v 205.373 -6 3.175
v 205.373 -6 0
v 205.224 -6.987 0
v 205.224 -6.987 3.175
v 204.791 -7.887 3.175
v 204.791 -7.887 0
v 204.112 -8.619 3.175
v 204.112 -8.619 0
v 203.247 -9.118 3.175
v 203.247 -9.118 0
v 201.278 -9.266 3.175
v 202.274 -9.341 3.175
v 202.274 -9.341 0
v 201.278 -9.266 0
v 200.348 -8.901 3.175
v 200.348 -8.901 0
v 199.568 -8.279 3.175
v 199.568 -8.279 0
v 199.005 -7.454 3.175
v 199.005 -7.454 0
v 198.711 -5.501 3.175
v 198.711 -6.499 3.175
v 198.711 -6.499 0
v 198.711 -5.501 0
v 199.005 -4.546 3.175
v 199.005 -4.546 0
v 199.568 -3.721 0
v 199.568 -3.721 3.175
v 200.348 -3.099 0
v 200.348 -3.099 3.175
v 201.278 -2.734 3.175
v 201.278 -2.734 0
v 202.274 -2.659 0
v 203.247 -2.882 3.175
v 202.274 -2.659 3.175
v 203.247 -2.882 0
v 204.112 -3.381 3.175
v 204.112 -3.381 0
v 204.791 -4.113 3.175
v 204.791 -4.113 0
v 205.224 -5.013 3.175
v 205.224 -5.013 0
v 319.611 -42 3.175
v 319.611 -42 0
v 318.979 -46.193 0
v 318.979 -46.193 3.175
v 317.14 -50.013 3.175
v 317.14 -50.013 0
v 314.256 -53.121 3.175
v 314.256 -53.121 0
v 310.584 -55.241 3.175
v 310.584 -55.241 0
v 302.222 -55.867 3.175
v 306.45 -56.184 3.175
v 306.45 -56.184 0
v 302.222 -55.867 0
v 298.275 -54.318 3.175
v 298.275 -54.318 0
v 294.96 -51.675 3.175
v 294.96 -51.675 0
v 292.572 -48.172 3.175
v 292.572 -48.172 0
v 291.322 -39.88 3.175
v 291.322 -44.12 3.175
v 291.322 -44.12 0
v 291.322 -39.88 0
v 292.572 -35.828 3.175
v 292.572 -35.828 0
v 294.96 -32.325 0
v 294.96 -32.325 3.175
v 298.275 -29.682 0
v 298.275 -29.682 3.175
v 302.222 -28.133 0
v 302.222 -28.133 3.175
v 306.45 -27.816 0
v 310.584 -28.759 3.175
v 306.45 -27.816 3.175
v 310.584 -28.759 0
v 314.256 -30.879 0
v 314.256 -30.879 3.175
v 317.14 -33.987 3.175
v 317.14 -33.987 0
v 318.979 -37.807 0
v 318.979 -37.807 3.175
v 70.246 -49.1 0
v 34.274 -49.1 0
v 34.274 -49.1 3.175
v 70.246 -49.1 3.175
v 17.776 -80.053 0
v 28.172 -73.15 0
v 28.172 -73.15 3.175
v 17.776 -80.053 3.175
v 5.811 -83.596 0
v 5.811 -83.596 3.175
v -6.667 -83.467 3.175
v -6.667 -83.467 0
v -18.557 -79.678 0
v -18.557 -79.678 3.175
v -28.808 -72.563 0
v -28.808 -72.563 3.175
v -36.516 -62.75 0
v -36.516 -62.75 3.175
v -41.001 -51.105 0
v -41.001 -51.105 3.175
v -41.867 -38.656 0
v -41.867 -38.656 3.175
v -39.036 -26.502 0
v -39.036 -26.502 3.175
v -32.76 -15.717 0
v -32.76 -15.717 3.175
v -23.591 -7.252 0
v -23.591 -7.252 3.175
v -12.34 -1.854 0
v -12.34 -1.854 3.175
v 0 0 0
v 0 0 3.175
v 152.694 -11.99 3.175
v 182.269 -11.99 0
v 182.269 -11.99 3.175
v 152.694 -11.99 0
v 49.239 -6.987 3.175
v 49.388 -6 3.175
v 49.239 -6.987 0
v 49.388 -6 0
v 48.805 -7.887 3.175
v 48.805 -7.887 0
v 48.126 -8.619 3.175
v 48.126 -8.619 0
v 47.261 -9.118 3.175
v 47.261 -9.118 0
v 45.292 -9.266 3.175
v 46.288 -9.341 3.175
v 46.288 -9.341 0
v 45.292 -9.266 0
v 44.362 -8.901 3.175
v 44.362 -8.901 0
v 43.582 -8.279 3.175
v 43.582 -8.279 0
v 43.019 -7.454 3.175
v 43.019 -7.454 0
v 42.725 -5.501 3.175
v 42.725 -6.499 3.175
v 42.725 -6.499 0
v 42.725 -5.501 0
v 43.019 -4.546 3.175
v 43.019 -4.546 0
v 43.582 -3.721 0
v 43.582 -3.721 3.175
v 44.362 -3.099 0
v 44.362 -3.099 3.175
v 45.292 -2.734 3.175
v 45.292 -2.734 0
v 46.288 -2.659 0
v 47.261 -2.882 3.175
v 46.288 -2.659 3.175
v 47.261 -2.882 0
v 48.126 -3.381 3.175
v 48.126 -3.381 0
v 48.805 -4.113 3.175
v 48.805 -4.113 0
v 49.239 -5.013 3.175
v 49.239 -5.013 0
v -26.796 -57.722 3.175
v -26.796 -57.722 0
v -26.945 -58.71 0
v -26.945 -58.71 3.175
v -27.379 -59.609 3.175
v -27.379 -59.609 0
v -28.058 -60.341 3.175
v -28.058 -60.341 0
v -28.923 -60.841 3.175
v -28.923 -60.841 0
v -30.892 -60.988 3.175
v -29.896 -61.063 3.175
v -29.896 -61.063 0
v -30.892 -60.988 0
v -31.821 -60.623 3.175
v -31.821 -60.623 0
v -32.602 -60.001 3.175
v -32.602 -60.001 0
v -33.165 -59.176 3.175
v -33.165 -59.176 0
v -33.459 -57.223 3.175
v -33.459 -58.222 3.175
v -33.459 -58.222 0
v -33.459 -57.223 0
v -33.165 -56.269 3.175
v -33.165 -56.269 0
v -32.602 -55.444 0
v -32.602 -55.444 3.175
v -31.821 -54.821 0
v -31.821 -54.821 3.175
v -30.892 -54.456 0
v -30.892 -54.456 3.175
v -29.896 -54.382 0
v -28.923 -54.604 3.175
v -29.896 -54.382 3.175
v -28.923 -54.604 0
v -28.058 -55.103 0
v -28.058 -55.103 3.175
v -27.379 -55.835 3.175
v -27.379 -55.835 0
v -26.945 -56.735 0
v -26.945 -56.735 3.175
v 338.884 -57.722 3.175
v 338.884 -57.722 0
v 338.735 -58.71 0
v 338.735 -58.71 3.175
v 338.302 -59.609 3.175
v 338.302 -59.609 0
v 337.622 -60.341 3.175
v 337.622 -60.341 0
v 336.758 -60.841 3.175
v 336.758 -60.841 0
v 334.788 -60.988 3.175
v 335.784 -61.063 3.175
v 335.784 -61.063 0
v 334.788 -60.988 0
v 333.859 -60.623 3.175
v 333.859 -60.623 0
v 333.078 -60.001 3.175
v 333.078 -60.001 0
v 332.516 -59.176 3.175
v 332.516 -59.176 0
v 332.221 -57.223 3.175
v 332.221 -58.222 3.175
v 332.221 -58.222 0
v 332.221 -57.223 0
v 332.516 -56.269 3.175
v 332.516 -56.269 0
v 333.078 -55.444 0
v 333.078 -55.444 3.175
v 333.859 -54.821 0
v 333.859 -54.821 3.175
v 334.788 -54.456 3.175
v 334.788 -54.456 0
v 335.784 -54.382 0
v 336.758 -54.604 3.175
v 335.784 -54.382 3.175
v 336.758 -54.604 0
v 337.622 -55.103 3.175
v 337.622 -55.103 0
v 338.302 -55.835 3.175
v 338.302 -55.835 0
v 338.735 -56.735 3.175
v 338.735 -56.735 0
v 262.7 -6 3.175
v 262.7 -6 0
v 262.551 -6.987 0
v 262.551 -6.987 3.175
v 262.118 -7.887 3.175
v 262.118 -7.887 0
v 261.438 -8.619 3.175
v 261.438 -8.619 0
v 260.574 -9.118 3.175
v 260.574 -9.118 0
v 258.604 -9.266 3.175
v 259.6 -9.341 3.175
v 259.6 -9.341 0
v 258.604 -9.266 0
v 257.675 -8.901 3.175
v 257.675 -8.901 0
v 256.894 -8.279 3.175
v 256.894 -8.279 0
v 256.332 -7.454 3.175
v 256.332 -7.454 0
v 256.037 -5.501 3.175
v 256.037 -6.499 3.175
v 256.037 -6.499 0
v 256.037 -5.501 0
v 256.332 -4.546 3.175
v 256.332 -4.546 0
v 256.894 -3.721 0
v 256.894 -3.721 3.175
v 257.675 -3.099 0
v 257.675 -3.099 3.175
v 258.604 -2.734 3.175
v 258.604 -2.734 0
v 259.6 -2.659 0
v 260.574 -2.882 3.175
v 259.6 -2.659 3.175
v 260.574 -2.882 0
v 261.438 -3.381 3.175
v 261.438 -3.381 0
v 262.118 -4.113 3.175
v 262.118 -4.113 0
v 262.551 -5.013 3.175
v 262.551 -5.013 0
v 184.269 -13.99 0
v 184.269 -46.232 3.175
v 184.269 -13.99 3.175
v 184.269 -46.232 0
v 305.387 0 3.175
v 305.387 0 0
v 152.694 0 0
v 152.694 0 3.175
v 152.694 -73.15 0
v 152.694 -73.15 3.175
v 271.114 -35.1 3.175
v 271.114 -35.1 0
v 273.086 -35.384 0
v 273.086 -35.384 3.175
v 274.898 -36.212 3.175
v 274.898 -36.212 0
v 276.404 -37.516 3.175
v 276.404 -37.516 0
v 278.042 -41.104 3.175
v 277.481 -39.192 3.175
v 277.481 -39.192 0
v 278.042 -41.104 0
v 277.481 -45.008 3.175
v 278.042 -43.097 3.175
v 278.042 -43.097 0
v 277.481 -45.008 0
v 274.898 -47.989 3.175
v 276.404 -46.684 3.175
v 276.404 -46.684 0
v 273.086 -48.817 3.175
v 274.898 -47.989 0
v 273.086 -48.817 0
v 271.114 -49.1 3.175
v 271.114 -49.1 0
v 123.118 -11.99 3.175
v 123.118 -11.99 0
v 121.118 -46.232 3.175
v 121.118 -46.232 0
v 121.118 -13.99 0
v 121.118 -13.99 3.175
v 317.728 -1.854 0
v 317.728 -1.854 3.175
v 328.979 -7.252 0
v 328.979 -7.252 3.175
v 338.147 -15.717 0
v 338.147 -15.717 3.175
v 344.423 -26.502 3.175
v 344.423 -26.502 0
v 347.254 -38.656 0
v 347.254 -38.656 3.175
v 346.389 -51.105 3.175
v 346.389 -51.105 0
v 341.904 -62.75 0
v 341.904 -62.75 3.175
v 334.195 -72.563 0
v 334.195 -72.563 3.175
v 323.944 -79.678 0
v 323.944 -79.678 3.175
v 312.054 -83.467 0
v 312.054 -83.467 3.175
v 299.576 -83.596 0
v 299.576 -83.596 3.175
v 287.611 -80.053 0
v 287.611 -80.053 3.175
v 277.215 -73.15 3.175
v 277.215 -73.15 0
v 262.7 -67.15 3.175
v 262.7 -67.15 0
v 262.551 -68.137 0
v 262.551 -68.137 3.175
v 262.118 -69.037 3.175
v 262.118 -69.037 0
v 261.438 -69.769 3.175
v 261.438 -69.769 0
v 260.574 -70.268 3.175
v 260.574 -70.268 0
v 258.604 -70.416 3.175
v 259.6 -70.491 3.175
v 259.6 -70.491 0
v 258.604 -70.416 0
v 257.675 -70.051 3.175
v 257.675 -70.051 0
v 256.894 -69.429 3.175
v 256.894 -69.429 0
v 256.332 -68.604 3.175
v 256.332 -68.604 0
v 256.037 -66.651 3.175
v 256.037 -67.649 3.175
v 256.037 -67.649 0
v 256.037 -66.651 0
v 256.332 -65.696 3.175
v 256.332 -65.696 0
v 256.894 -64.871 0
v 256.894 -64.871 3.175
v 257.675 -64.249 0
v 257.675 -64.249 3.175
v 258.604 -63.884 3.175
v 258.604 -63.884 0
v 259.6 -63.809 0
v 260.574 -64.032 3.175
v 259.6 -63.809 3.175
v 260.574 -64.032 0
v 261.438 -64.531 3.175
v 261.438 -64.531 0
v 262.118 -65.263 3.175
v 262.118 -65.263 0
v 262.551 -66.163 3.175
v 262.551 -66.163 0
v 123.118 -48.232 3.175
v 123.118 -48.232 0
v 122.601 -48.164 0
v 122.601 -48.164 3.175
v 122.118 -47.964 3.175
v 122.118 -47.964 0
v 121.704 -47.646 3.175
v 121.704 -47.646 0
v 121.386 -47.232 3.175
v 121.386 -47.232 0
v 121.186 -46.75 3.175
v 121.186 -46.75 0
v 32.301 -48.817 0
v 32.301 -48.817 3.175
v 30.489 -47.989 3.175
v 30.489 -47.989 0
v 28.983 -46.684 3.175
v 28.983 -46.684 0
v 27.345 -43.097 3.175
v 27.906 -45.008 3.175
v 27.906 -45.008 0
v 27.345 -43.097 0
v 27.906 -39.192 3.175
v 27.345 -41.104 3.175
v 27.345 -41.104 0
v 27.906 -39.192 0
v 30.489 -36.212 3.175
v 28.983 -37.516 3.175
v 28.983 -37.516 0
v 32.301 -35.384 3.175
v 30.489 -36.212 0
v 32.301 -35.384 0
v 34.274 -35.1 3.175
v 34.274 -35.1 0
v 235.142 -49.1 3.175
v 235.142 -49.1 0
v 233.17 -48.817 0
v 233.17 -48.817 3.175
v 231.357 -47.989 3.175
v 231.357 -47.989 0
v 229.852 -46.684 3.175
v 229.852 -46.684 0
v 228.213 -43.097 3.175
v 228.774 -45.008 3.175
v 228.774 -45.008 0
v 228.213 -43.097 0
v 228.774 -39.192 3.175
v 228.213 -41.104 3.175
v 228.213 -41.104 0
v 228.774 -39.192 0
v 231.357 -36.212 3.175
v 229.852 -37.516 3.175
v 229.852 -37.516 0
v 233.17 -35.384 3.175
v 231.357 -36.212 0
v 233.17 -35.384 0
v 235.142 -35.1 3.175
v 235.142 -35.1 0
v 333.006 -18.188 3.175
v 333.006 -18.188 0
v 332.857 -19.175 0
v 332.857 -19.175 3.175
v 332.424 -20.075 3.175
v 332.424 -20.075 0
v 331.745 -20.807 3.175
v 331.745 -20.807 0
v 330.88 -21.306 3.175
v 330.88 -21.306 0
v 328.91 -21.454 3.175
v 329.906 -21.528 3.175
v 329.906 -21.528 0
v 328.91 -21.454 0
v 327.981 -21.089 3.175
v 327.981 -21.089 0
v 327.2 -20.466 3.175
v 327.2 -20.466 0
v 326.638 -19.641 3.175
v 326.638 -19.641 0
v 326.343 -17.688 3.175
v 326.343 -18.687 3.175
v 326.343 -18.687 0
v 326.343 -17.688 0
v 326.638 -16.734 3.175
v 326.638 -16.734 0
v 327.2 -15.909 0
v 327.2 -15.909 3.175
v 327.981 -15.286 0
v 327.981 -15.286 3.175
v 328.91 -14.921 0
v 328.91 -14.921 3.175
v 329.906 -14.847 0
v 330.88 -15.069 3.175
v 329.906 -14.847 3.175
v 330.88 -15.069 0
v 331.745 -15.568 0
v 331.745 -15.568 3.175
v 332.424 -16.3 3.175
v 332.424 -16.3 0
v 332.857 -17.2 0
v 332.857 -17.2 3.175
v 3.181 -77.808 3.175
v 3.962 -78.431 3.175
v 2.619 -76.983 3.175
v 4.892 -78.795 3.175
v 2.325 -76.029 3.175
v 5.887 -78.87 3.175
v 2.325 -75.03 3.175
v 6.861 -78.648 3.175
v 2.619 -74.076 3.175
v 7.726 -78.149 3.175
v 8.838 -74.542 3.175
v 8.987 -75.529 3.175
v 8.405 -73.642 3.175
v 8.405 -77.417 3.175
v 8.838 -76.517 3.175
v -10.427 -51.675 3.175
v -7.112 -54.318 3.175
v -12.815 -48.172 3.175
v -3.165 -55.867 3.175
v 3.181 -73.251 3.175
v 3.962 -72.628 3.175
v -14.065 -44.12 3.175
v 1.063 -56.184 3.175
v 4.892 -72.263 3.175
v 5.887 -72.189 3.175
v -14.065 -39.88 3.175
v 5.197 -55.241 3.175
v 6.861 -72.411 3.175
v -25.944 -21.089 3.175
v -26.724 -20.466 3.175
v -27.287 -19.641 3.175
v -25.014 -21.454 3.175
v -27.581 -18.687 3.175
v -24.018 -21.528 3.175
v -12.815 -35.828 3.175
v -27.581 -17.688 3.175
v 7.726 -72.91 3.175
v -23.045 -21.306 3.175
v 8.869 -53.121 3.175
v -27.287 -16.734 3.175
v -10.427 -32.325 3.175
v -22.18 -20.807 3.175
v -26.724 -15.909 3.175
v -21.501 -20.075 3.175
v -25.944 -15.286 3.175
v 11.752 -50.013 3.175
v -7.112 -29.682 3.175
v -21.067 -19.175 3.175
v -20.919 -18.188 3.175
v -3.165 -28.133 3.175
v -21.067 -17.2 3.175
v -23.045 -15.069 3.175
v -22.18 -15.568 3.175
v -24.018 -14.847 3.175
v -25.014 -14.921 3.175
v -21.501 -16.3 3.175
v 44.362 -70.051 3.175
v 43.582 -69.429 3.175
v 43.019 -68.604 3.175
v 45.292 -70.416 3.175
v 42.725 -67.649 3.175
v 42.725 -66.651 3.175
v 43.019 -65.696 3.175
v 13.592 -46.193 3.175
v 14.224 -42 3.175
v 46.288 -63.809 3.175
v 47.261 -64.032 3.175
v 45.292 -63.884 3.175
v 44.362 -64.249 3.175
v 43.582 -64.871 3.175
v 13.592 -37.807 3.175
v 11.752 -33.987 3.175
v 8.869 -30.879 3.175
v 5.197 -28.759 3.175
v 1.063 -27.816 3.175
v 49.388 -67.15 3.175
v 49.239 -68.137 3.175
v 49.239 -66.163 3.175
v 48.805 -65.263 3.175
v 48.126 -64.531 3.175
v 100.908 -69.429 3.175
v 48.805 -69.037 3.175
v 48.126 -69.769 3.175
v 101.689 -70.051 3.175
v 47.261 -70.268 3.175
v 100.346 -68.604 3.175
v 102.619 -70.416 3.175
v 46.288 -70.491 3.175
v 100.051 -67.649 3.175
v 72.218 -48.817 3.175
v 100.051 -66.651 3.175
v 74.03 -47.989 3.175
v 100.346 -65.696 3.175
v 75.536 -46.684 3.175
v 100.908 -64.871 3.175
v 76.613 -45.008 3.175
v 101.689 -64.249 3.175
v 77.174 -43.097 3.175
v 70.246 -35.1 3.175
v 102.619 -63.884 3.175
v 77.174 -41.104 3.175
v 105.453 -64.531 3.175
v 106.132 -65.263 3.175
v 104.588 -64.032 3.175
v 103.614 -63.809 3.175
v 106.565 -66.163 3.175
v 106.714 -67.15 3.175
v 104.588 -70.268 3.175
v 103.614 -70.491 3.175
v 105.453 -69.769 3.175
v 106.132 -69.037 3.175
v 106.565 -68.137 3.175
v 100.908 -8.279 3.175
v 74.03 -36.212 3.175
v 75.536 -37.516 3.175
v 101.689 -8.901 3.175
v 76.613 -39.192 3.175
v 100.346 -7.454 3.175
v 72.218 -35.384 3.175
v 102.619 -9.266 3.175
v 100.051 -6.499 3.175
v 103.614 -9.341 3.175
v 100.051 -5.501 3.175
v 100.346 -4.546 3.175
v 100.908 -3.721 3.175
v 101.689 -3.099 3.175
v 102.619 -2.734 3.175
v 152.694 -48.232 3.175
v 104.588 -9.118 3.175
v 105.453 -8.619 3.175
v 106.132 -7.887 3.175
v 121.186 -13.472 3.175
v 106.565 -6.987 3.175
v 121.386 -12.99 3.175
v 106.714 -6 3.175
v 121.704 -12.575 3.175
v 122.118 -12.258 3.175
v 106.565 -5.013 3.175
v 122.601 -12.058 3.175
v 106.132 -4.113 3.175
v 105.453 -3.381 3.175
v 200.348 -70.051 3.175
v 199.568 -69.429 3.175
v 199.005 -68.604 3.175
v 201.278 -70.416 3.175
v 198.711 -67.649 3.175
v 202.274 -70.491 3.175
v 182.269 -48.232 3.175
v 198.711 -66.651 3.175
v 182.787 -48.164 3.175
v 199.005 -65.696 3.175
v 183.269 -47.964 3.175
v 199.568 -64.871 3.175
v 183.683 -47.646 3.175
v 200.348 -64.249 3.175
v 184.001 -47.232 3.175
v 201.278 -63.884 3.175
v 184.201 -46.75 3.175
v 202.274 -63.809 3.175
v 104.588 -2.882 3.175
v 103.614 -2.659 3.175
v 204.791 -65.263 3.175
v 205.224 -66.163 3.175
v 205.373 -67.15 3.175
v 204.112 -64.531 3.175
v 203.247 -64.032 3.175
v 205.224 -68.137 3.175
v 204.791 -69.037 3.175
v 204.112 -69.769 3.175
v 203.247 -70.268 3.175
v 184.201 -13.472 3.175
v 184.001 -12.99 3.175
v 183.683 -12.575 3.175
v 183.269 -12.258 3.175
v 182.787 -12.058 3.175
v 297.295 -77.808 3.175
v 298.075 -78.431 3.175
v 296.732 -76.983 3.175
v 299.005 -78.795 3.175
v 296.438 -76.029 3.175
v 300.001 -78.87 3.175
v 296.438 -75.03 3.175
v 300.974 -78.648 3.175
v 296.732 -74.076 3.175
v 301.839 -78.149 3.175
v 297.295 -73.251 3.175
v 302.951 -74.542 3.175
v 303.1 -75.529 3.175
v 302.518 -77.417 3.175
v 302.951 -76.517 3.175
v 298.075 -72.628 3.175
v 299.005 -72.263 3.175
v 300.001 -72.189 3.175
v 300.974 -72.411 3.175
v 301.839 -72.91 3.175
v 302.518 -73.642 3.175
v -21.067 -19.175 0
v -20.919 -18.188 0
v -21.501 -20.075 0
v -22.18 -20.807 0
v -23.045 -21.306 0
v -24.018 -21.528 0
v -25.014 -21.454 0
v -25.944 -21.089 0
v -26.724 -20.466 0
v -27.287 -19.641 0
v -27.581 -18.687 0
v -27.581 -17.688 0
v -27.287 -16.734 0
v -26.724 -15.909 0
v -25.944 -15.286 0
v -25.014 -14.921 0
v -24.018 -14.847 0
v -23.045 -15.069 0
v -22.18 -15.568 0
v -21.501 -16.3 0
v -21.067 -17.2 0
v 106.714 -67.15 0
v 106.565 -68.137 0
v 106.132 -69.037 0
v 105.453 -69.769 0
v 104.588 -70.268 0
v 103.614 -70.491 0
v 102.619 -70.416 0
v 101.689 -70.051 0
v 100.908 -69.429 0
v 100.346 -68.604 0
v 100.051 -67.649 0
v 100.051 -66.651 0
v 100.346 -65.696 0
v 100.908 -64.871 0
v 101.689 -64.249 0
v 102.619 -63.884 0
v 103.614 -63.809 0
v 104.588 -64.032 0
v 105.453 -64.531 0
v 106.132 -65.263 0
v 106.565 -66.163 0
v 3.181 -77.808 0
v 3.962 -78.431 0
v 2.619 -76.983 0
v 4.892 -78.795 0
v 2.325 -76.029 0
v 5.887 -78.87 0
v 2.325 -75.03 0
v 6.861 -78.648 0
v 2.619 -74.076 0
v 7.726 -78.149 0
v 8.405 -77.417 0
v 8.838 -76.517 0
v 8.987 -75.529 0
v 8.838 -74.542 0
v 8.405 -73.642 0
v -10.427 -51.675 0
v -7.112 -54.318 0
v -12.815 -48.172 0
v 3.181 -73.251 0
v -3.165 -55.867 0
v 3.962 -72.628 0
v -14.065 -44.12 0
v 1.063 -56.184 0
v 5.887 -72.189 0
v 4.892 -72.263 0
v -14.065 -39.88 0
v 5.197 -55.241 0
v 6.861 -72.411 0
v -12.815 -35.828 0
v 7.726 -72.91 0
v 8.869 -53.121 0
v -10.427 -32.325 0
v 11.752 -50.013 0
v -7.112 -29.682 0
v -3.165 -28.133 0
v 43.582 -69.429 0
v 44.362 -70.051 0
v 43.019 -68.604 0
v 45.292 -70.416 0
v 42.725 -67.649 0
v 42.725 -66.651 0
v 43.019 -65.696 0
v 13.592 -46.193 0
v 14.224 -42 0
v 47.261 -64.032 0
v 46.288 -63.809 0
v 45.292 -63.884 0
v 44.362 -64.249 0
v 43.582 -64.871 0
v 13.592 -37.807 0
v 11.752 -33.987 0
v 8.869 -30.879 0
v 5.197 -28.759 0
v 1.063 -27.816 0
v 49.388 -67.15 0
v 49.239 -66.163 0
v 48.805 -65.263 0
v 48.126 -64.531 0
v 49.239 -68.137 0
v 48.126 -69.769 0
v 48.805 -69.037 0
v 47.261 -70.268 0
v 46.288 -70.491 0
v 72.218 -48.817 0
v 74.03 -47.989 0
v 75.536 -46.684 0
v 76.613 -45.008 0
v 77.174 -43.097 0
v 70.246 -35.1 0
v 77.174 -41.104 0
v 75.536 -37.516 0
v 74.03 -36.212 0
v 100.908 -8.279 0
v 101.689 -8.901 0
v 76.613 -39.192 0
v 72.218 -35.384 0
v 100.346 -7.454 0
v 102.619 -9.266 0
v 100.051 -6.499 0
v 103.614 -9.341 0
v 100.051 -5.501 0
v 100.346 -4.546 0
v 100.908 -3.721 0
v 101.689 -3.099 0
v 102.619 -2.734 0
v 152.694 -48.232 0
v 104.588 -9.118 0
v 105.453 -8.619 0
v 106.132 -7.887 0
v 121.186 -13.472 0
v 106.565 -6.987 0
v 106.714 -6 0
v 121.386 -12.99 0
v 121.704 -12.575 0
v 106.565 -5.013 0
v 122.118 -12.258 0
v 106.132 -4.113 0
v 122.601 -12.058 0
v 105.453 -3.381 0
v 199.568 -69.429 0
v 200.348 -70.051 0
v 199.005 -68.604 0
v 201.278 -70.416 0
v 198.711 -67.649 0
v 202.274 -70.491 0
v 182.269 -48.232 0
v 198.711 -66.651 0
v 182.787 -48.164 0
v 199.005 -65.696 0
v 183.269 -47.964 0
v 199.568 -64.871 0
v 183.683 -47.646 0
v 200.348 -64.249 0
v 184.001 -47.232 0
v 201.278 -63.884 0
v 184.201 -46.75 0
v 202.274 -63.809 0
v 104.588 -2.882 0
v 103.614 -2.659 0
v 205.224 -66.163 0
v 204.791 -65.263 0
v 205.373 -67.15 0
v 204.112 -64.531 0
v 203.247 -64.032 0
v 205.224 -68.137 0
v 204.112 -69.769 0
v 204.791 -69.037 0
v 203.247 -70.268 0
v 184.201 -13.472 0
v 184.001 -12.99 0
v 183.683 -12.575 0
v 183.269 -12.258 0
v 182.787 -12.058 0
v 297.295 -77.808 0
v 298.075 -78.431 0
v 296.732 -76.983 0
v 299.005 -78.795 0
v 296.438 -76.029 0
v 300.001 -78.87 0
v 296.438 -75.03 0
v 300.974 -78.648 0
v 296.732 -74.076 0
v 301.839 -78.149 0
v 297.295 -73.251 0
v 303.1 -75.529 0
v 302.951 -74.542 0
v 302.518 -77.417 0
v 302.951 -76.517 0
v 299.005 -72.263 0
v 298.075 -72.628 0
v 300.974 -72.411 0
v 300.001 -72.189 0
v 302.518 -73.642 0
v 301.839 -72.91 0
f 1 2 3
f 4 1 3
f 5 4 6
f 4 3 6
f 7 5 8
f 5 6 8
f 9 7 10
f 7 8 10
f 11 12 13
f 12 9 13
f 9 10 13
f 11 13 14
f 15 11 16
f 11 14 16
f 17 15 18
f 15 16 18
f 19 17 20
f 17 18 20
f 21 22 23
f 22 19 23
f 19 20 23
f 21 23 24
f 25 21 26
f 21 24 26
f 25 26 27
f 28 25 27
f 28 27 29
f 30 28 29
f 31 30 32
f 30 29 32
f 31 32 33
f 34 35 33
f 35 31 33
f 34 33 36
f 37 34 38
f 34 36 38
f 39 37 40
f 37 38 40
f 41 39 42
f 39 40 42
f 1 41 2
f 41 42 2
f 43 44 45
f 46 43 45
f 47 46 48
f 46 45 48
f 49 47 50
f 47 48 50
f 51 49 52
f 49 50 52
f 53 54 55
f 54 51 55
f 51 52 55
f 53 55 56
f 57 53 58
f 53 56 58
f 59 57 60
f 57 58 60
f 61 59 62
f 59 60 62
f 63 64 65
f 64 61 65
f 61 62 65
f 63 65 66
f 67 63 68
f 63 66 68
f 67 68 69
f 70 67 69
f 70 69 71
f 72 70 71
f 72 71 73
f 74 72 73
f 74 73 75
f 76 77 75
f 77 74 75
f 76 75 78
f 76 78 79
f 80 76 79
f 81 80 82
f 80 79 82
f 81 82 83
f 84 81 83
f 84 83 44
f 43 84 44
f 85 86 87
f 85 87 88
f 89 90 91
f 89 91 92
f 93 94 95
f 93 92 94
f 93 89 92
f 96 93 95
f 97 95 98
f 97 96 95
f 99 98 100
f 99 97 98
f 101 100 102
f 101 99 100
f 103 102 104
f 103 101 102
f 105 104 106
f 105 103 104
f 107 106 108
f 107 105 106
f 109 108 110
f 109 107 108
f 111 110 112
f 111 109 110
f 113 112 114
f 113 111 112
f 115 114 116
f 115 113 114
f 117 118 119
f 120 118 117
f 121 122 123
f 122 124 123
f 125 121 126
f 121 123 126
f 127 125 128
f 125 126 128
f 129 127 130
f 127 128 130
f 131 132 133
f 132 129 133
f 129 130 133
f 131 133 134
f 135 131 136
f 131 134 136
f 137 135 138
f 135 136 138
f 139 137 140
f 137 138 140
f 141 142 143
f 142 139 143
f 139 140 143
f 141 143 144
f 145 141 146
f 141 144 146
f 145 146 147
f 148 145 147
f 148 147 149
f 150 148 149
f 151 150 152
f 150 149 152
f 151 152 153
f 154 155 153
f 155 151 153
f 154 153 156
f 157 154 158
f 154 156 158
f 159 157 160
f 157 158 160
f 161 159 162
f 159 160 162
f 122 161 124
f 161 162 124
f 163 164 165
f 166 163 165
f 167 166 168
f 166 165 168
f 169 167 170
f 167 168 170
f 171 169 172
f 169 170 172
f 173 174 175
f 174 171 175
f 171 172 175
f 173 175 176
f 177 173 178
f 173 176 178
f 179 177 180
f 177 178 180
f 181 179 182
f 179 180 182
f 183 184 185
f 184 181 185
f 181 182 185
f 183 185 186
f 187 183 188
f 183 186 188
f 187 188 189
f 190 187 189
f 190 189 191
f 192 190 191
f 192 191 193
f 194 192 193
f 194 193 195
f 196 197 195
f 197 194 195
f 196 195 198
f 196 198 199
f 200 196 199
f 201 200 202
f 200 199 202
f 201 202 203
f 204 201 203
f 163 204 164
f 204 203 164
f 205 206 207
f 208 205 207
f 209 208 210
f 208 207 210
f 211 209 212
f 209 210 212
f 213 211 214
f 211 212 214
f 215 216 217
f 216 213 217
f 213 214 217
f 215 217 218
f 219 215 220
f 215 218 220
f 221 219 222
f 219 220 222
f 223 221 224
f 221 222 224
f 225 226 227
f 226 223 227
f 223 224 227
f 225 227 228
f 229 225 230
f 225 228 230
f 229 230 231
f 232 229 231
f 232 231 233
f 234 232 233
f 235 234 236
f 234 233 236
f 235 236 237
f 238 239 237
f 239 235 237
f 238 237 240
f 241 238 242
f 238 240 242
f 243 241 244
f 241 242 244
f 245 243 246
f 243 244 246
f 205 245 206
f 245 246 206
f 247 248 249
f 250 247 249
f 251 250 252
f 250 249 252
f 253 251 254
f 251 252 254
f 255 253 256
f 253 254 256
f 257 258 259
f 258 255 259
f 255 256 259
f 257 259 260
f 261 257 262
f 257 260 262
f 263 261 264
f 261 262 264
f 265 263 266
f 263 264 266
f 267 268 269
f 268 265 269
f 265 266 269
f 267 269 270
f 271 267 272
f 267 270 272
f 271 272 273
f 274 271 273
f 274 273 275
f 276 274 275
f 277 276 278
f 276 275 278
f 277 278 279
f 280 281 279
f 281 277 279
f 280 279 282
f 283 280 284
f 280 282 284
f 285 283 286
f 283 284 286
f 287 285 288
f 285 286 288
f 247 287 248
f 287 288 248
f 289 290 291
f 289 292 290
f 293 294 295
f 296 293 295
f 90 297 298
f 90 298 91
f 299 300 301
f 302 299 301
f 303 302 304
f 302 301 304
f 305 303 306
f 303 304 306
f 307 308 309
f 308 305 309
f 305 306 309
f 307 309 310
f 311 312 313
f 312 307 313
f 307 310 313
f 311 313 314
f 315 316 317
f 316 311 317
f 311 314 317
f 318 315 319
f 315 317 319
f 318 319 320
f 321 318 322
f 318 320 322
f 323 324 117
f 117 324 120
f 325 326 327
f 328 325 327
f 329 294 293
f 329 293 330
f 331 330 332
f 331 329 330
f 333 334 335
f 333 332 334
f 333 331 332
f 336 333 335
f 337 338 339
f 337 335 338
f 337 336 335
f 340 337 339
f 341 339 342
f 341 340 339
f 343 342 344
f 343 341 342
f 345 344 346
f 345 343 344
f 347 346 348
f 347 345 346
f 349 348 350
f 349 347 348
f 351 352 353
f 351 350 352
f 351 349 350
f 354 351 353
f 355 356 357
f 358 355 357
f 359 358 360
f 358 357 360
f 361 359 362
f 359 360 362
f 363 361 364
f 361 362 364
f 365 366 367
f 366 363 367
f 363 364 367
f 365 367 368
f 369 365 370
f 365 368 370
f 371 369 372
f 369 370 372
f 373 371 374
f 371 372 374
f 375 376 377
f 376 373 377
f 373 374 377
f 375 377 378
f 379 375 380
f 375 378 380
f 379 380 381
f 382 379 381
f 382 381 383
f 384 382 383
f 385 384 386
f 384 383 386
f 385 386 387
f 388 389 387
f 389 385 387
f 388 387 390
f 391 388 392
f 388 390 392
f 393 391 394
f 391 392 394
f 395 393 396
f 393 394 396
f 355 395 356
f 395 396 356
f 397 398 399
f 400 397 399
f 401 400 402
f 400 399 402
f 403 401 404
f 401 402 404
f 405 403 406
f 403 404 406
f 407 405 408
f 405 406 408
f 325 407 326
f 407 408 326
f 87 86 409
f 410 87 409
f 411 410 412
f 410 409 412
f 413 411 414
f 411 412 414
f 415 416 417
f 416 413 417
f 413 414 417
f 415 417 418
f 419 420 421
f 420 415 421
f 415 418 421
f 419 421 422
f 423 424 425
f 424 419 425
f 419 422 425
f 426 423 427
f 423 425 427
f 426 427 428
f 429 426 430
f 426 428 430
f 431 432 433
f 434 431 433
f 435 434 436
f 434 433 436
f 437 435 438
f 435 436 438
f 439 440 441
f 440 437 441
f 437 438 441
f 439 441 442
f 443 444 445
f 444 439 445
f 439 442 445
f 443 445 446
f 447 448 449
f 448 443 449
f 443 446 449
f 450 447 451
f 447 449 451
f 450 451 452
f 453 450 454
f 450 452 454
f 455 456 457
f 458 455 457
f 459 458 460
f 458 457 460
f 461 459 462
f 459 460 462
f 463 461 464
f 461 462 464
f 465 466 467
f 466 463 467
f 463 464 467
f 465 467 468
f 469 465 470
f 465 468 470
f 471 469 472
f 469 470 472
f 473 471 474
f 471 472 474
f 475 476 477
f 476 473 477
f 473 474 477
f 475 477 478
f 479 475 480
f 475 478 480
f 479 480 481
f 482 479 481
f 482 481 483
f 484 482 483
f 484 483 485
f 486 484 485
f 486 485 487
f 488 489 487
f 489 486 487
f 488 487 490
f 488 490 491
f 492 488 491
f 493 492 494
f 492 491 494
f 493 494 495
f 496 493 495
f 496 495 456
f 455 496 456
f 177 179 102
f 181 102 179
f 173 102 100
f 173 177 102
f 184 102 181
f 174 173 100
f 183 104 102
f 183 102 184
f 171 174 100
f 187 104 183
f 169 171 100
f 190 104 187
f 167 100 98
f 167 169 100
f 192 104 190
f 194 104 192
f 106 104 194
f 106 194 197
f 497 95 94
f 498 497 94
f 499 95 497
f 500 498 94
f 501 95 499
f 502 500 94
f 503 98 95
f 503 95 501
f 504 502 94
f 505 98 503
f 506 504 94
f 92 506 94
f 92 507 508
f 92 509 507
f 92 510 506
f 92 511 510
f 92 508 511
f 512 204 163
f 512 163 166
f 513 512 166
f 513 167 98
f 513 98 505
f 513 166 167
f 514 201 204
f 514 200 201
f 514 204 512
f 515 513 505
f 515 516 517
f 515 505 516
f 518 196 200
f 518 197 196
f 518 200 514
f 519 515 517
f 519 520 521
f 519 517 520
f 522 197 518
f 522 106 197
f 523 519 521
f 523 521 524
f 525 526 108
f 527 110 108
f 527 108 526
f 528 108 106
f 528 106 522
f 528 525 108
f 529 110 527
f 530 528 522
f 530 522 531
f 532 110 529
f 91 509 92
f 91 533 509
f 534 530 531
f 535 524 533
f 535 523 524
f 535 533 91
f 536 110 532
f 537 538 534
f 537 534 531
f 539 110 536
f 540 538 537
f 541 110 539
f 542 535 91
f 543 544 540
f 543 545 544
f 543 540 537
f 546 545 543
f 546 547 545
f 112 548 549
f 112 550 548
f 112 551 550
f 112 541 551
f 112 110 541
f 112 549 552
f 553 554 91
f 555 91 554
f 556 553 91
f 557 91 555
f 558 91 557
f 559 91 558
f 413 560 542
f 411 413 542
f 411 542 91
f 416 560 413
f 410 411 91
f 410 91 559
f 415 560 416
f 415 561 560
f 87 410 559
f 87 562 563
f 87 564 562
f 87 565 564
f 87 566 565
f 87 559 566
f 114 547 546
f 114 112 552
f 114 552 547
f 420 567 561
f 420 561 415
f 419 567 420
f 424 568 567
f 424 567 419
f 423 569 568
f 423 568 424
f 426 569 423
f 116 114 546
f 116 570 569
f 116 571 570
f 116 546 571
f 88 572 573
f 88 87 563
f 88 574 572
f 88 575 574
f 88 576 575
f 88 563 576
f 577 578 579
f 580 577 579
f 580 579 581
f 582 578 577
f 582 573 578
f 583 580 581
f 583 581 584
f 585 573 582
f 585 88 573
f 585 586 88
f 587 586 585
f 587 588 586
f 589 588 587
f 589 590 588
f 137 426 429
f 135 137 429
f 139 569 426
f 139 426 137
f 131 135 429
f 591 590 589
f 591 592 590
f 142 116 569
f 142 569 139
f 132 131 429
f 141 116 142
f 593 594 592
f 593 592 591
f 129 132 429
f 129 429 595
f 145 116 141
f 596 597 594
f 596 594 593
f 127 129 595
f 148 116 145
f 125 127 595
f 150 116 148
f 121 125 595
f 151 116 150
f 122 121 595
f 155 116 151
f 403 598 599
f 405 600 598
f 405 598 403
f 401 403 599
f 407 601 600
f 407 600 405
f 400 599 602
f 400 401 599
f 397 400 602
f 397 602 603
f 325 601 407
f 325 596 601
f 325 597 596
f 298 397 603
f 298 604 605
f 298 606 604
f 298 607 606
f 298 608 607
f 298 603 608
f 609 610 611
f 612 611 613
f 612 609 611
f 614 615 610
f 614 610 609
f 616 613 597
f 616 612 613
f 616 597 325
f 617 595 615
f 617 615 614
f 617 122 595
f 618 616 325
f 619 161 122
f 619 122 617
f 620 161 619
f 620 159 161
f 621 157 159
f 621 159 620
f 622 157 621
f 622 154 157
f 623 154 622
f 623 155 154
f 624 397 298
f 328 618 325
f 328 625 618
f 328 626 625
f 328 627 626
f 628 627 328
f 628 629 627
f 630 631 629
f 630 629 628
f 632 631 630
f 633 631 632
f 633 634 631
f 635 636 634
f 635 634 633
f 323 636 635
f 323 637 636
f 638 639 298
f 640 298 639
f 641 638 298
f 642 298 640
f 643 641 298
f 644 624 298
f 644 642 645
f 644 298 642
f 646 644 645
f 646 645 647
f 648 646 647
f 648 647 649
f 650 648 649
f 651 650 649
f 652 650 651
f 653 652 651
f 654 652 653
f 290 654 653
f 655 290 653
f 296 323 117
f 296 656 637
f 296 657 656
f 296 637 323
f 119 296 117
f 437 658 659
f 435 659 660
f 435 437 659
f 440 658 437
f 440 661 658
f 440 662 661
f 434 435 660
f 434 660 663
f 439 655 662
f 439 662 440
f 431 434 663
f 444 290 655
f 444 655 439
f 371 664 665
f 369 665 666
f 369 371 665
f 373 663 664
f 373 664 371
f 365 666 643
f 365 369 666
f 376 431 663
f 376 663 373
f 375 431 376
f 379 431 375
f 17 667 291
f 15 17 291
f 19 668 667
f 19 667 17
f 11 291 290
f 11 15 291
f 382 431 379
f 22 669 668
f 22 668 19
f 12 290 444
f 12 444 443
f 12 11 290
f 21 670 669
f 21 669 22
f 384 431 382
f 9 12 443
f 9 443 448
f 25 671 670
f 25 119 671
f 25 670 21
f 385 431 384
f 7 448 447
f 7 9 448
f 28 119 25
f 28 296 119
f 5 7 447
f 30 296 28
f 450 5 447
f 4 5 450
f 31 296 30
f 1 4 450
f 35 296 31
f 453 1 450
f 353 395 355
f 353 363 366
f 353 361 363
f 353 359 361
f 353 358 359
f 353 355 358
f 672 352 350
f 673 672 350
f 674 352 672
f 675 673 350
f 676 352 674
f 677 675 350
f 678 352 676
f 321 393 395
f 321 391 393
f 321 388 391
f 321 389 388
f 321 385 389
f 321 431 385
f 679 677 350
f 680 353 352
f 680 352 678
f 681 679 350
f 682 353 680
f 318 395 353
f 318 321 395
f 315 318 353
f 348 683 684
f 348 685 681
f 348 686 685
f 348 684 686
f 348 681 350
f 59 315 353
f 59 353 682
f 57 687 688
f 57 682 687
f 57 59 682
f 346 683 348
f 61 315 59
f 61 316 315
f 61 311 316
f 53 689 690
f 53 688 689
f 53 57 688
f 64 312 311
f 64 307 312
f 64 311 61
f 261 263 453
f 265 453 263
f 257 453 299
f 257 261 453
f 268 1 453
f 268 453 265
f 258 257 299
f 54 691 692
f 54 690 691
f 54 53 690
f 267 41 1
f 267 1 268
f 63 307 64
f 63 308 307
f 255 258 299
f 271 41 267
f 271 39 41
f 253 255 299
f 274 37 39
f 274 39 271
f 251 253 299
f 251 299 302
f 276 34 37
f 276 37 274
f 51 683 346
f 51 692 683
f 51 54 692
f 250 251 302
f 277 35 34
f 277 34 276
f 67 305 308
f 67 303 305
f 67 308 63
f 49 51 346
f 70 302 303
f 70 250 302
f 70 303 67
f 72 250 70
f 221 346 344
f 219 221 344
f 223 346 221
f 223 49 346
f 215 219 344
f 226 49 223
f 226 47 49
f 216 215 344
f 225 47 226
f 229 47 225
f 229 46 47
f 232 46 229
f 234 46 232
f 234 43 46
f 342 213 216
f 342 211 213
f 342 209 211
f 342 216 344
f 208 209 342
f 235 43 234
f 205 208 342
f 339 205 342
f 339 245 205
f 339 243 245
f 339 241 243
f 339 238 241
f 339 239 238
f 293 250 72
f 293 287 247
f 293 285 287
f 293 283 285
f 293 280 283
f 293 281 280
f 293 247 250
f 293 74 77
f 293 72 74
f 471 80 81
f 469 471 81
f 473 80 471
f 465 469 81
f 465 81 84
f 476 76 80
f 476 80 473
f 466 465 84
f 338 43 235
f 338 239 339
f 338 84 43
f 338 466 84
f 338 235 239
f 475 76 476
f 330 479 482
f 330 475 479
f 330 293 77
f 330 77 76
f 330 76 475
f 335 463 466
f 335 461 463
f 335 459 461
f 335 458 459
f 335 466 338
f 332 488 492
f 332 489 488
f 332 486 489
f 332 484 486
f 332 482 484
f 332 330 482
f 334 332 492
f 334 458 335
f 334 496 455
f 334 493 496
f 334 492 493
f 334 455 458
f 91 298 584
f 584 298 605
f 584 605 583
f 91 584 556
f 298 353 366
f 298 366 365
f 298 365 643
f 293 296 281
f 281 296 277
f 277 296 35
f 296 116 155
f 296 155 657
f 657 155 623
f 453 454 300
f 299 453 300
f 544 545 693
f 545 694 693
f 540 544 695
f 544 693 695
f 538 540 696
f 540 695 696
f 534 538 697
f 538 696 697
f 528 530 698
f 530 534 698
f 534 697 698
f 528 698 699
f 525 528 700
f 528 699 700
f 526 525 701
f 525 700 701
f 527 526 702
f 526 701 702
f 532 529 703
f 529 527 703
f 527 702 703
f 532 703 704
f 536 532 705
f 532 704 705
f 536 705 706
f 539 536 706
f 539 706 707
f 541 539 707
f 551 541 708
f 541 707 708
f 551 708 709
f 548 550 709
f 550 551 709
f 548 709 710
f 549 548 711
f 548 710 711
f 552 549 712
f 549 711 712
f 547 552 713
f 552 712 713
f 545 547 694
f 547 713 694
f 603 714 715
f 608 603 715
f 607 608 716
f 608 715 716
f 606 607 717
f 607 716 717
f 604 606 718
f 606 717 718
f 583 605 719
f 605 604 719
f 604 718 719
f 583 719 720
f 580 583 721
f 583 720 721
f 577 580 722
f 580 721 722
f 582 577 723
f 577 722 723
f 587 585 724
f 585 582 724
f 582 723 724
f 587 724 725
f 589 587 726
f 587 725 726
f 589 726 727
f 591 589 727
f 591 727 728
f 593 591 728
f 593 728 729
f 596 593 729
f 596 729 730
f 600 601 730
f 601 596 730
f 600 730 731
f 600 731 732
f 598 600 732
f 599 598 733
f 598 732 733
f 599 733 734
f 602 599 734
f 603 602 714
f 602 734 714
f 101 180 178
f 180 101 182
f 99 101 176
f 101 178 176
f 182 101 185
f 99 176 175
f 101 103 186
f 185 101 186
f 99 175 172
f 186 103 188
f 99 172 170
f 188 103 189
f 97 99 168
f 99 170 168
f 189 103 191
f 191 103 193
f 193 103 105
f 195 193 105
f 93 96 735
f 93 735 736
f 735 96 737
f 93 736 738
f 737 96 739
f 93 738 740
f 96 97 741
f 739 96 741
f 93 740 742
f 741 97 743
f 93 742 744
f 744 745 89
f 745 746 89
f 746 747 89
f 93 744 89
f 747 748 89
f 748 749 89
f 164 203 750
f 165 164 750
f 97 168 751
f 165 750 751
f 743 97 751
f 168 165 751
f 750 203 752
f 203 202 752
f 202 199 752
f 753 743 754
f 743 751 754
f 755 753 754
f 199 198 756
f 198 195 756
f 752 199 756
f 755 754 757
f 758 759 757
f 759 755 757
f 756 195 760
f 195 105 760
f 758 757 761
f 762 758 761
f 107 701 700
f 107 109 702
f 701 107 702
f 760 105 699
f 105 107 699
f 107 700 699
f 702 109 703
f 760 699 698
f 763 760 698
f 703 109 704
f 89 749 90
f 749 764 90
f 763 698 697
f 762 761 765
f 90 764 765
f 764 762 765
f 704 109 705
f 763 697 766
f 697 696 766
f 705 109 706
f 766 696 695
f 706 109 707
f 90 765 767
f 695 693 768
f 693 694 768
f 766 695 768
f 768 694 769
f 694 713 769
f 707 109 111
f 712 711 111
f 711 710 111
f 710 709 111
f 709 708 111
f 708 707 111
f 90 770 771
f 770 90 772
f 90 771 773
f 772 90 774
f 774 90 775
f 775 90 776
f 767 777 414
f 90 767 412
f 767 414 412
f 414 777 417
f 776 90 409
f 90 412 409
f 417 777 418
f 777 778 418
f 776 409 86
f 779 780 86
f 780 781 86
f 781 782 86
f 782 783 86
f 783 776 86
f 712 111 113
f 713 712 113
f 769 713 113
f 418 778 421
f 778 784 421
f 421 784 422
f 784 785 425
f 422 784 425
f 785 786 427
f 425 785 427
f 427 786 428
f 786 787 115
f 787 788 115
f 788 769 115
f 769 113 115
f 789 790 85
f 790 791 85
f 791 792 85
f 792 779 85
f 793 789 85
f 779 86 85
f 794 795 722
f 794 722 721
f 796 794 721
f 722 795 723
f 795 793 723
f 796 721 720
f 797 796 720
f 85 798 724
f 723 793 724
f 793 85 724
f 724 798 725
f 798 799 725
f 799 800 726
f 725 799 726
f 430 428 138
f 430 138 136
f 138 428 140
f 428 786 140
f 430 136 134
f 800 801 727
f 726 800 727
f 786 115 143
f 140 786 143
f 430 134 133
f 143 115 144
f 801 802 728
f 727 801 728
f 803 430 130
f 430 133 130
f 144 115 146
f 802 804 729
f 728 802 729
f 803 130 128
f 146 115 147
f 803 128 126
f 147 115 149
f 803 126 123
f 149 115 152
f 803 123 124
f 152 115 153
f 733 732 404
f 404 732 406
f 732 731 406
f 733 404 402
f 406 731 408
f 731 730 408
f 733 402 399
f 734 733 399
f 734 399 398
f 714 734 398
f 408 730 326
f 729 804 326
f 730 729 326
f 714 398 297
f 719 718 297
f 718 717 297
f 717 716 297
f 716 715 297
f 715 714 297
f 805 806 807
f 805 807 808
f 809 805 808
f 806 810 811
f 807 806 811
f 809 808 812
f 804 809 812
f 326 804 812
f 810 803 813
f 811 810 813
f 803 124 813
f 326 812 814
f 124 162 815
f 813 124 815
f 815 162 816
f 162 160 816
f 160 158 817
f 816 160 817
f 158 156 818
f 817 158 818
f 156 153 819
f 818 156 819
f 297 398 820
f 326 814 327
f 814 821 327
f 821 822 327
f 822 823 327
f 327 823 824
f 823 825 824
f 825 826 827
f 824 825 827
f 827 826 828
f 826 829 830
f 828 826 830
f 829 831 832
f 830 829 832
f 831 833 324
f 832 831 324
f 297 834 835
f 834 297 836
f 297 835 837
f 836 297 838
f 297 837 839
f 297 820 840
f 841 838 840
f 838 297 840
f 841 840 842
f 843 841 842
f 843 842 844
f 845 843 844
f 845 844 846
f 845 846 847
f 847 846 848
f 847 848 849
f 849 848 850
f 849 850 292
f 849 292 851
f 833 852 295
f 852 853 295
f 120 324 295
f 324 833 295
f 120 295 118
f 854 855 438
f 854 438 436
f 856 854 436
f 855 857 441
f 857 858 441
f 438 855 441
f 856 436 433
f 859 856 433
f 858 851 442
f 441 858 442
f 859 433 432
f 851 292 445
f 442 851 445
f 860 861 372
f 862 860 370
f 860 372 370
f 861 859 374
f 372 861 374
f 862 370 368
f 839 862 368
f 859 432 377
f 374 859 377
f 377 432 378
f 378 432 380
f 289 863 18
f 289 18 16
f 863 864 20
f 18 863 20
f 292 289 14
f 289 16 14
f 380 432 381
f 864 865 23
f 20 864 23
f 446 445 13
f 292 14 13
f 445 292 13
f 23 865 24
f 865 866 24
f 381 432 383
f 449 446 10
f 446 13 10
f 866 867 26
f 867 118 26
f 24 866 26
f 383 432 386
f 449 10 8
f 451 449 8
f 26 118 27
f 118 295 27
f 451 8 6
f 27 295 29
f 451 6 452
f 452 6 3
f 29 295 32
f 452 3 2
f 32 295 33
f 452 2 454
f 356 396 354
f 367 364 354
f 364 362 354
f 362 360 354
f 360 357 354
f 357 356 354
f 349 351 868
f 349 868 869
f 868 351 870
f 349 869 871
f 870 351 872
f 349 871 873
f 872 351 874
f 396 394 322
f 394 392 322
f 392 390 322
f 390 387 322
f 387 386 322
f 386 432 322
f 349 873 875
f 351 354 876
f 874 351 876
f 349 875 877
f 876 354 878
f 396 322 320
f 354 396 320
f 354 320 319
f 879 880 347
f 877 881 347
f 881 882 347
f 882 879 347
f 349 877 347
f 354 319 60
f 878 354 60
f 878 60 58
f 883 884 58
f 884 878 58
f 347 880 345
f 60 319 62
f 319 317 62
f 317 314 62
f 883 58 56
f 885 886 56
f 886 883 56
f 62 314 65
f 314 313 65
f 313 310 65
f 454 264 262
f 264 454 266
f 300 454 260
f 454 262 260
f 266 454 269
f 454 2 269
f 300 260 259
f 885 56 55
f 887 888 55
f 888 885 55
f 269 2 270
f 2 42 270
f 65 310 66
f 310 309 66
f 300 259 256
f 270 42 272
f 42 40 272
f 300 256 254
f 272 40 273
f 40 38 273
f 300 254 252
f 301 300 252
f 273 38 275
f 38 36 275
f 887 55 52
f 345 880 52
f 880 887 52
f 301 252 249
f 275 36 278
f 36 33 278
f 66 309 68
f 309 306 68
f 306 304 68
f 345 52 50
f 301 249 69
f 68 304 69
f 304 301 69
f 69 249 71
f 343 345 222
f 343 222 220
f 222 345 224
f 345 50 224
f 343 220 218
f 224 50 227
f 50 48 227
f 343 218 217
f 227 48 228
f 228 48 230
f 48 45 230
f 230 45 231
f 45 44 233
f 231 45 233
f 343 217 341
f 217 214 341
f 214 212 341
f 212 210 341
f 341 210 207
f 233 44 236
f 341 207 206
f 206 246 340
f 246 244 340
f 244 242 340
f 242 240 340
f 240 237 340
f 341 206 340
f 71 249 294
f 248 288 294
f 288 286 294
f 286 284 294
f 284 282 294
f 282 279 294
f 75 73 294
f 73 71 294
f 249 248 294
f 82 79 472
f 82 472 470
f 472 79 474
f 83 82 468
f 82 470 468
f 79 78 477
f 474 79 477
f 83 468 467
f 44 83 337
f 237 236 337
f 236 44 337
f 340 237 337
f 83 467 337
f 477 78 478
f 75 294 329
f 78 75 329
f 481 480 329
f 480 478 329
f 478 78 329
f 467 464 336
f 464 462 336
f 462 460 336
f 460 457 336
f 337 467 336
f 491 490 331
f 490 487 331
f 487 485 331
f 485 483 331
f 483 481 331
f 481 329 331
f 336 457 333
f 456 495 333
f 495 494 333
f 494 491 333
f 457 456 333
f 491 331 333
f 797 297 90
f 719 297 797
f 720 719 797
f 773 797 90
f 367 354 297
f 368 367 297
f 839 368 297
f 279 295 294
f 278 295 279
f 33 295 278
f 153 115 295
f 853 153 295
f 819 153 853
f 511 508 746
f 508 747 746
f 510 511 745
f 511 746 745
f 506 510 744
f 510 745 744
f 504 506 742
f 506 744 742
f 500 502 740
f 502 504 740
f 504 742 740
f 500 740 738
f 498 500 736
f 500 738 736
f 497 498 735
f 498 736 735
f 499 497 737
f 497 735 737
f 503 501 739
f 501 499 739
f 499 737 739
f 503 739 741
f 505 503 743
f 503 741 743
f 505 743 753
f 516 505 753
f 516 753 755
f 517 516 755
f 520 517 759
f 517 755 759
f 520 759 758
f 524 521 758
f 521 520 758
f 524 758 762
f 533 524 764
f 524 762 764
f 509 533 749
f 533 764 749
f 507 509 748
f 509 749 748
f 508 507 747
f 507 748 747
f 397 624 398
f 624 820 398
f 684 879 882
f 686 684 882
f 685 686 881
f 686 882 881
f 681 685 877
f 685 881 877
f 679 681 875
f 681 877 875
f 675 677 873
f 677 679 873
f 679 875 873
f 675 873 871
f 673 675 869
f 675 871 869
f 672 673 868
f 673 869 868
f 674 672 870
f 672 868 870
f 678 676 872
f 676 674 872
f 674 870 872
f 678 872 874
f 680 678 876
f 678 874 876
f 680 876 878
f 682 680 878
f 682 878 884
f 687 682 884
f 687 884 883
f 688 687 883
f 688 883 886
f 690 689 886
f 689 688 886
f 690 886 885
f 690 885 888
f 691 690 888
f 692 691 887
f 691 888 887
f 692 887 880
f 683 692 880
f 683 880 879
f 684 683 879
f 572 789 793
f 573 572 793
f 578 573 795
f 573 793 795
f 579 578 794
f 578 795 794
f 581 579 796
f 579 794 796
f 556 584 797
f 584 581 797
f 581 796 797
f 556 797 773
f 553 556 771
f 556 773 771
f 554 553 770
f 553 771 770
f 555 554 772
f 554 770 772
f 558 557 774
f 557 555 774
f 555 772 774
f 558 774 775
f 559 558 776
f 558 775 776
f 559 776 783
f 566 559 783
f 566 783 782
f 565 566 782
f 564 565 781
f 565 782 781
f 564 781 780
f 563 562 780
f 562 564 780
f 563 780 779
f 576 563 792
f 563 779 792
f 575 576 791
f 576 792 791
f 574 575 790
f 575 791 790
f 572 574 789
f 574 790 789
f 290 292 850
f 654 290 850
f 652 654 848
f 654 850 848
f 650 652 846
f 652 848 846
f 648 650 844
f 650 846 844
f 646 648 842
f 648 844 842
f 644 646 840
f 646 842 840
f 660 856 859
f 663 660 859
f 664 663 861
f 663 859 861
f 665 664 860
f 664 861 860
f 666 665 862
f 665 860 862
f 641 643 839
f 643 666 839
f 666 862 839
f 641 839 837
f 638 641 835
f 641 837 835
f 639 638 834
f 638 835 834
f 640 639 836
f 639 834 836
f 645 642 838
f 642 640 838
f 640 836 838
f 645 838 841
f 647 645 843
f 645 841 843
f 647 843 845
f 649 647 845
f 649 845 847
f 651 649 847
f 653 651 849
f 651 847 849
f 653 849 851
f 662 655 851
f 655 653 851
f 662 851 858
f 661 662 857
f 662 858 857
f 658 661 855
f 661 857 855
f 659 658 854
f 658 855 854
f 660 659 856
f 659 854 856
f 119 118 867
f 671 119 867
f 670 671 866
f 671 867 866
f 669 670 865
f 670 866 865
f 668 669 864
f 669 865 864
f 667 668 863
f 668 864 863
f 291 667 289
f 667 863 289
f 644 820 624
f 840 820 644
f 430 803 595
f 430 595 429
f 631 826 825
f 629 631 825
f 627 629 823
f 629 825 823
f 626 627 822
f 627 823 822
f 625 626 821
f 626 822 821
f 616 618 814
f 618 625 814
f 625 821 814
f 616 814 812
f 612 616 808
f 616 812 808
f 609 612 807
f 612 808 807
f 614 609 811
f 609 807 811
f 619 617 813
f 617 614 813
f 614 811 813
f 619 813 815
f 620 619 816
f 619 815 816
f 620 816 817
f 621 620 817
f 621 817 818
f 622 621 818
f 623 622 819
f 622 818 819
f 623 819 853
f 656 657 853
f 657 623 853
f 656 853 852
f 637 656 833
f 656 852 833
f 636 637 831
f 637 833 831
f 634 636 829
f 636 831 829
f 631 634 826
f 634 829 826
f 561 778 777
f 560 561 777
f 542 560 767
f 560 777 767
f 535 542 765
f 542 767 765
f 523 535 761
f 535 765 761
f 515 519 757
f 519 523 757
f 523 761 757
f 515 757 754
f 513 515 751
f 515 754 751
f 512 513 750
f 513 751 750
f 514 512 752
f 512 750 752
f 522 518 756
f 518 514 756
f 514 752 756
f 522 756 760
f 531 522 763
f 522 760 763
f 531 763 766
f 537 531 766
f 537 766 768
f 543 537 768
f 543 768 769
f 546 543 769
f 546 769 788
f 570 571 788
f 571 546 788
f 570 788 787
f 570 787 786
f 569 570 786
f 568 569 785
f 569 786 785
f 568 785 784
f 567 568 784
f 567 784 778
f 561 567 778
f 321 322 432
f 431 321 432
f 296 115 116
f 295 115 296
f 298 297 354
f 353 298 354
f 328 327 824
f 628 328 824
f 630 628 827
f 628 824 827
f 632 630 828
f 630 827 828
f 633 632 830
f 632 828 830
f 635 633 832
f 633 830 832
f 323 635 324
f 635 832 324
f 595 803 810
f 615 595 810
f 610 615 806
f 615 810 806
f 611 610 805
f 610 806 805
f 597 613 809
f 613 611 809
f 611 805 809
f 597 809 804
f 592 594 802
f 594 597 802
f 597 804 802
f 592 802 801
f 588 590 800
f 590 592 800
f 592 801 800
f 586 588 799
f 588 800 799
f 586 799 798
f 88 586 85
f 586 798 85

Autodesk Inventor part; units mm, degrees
ref_plane "YZ Plane" through (0, 0, 0) normal (1, 0, 0) x (0, 1, 0)
ref_plane "XZ Plane" through (0, 0, 0) normal (0, 1, 0) x (-1, 0, 0)
ref_plane "XY Plane" through (0, 0, 0) normal (0, 0, 1) x (1, 0, 0)
sketch "Sketch3" plane through (0, 0, 0) normal (0, 0, 1) x (1, 0, 0)
  circle A0 centre (46.0375, -6) radius 3.35
  circle A1 centre (46.0375, -67.15) radius 3.35
  circle A2 centre (5.6371, -75.5294) radius 3.35
  circle A3 centre (-30.1464, -57.7223) radius 3.35
  circle A4 centre (-24.2686, -18.1875) radius 3.35
  line L0 (152.6937, 0) -> (152.6937, -73.15) construction
  line L1 (0, 0) -> (152.6937, 0)
  arc A5 (0, 0) -> (28.1723, -73.15) centre (0, -42) ccw
  line L2 (152.6937, -73.15) -> (28.1723, -73.15)
  arc A6 (24.0029, -27.5826) -> (10.7567, -16.1486) centre (0, -42) ccw
  circle A7 centre (0, -42) radius 14.224
  line L3 (9.525, -14) -> (9.525, -14.3021)
  arc A8 (11.525, -12) -> (9.525, -14) centre (11.525, -14) ccw
  arc A9 (9.525, -14.3021) -> (10.7567, -16.1486) centre (11.525, -14.3021) ccw
  arc A10 (24.0029, -27.5826) -> (25.7174, -28.5528) centre (25.7174, -26.5528) ccw
  line L4 (152.6937, -73.15) -> (277.2151, -73.15)
  line L5 (305.3873, 0) -> (152.6937, 0)
  circle A11 centre (259.3498, -6) radius 3.35
  circle A12 centre (259.3498, -67.15) radius 3.35
  circle A13 centre (299.7503, -75.5294) radius 3.35
  circle A14 centre (335.5338, -57.7223) radius 3.35
  circle A15 centre (329.6559, -18.1875) radius 3.35
  arc A16 (277.2151, -73.15) -> (305.3873, 0) centre (305.3873, -42) ccw
  arc A17 (294.6307, -16.1486) -> (281.3845, -27.5826) centre (305.3873, -42) ccw
  circle A18 centre (305.3873, -42) radius 14.224
  line L6 (295.8623, -14) -> (295.8623, -14.3021)
  arc A19 (295.8623, -14) -> (293.8623, -12) centre (293.8623, -14) ccw
  arc A20 (294.6307, -16.1486) -> (295.8623, -14.3021) centre (293.8623, -14.3021) ccw
  arc A21 (279.67, -28.5528) -> (281.3845, -27.5826) centre (279.67, -26.5528) ccw
  line L7 (34.2736, -42.1004) -> (70.2455, -42.1004) construction
  line L8 (34.2736, -49.1004) -> (70.2455, -49.1004)
  line L9 (70.2455, -35.1004) -> (34.2736, -35.1004)
  arc A22 (34.2736, -35.1004) -> (34.2736, -49.1004) centre (34.2736, -42.1004) ccw
  arc A23 (70.2455, -49.1004) -> (70.2455, -35.1004) centre (70.2455, -42.1004) ccw
  line L10 (271.1137, -42.1004) -> (235.1419, -42.1004) construction
  line L11 (271.1137, -49.1004) -> (235.1419, -49.1004)
  line L12 (235.1419, -35.1004) -> (271.1137, -35.1004)
  arc A24 (271.1137, -49.1004) -> (271.1137, -35.1004) centre (271.1137, -42.1004) ccw
  arc A25 (235.1419, -35.1004) -> (235.1419, -49.1004) centre (235.1419, -42.1004) ccw
  circle A26 centre (103.364, -67.15) radius 3.35 projected
  circle A27 centre (202.0233, -67.15) radius 3.35 projected
  circle A28 centre (202.0233, -6) radius 3.35
  circle A29 centre (103.364, -6) radius 3.35
  line L13 (123.1183, -11.9896) -> (152.6937, -11.9896)
  line L14 (152.6937, -11.9896) -> (152.6937, -48.232) construction
  line L15 (152.6937, -48.232) -> (123.1183, -48.232)
  line L16 (121.1183, -46.232) -> (121.1183, -13.9896)
  arc A30 (123.1183, -11.9896) -> (121.1183, -13.9896) centre (123.1183, -13.9896) ccw
  arc A31 (121.1183, -46.232) -> (123.1183, -48.232) centre (123.1183, -46.232) ccw
  line L17 (182.269, -11.9896) -> (152.6937, -11.9896)
  line L18 (152.6937, -48.232) -> (182.269, -48.232)
  line L19 (184.269, -46.232) -> (184.269, -13.9896)
  arc A32 (184.269, -13.9896) -> (182.269, -11.9896) centre (182.269, -13.9896) ccw
  arc A33 (182.269, -48.232) -> (184.269, -46.232) centre (182.269, -46.232) ccw
  point P0 (24.5596, -28.5528)
  point P1 (9.525, -15.6699)
  point P2 (280.8278, -28.5528)
  point P3 (295.8623, -15.6699)
  point P4 (52.2596, -42.1004)
  point P5 (253.1278, -42.1004)
  dimension "d38" = 28.448
  dimension "d39" = 2
  dimension "d40" = 2
  dimension "d43" = 14
  dimension "d44" = 2
  dimension "d45" = 6
  dimension "d46" = 213.3123
extrude "Extrusion2" add sketch "Sketch3" along normal blind 3.175
properties part number "Mech Panel v7 skin exterior" material "Polycarbonate, Clear"
